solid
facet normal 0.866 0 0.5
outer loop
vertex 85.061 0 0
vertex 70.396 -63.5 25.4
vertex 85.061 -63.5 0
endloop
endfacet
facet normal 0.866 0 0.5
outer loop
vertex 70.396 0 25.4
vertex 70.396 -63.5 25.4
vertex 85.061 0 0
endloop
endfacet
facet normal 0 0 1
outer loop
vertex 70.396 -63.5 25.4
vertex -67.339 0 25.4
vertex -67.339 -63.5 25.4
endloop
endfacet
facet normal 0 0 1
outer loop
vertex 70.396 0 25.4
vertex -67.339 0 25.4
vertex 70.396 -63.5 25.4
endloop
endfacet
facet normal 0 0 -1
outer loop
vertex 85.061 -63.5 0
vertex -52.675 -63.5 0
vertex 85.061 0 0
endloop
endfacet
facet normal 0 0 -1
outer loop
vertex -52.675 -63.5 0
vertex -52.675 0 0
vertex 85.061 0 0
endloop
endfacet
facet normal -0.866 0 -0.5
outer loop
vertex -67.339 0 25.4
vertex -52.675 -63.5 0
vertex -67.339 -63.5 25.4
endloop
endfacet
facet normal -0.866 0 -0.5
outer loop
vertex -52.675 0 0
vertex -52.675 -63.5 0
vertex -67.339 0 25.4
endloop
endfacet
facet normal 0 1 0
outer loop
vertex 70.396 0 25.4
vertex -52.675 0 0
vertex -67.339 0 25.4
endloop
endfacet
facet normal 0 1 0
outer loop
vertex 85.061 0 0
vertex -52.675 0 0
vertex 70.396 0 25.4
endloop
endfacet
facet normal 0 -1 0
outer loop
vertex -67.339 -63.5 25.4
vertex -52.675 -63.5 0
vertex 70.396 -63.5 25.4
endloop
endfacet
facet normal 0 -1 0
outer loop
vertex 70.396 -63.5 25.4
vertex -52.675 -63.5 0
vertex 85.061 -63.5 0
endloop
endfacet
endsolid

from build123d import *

# Parameters (mm, degrees)
F0_W     = 152.4
F0_H     = 63.5
F1_DEPTH = 25.4
F2_SIZE2 = 14.664687
F2_SIZE  = 25.39999
F3_SIZE2 = 14.664687
F3_SIZE  = 25.39999


# Not quite as in the source:
# - a fillet or chamfer is up to 0.001 mm smaller than in the source, because OpenCascade refuses the exact size


with BuildPart() as f1:
    # F0 (on Top) → F1 (new body)
    with BuildSketch(Plane.XY):
        with Locations((8.8605511625, -31.75)):
            Rectangle(F0_W, F0_H)
    extrude(amount=F1_DEPTH)

    # F2 (size 25.4 and 14.6646968374 in the source; OpenCascade refuses exactly that, so slightly less here)
    f2_edges = [f1.edges().sort_by_distance(p)[0] for p in [
        (85.060551, -31.75, 25.4),
    ]]
    f2_side = f1.faces().sort_by_distance((85.060551, -31.75, 12.7))[0]
    chamfer(f2_edges, length=F2_SIZE, length2=F2_SIZE2, reference=f2_side)

    # F3 (size 25.4 and 14.6646968374 in the source; OpenCascade refuses exactly that, so slightly less here)
    f3_edges = [f1.edges().sort_by_distance(p)[0] for p in [
        (-67.339449, -31.75, 0),
    ]]
    f3_side = f1.faces().sort_by_distance((-67.339449, -31.75, 12.7))[0]
    chamfer(f3_edges, length=F3_SIZE, length2=F3_SIZE2, reference=f3_side)


solid = f1.part
